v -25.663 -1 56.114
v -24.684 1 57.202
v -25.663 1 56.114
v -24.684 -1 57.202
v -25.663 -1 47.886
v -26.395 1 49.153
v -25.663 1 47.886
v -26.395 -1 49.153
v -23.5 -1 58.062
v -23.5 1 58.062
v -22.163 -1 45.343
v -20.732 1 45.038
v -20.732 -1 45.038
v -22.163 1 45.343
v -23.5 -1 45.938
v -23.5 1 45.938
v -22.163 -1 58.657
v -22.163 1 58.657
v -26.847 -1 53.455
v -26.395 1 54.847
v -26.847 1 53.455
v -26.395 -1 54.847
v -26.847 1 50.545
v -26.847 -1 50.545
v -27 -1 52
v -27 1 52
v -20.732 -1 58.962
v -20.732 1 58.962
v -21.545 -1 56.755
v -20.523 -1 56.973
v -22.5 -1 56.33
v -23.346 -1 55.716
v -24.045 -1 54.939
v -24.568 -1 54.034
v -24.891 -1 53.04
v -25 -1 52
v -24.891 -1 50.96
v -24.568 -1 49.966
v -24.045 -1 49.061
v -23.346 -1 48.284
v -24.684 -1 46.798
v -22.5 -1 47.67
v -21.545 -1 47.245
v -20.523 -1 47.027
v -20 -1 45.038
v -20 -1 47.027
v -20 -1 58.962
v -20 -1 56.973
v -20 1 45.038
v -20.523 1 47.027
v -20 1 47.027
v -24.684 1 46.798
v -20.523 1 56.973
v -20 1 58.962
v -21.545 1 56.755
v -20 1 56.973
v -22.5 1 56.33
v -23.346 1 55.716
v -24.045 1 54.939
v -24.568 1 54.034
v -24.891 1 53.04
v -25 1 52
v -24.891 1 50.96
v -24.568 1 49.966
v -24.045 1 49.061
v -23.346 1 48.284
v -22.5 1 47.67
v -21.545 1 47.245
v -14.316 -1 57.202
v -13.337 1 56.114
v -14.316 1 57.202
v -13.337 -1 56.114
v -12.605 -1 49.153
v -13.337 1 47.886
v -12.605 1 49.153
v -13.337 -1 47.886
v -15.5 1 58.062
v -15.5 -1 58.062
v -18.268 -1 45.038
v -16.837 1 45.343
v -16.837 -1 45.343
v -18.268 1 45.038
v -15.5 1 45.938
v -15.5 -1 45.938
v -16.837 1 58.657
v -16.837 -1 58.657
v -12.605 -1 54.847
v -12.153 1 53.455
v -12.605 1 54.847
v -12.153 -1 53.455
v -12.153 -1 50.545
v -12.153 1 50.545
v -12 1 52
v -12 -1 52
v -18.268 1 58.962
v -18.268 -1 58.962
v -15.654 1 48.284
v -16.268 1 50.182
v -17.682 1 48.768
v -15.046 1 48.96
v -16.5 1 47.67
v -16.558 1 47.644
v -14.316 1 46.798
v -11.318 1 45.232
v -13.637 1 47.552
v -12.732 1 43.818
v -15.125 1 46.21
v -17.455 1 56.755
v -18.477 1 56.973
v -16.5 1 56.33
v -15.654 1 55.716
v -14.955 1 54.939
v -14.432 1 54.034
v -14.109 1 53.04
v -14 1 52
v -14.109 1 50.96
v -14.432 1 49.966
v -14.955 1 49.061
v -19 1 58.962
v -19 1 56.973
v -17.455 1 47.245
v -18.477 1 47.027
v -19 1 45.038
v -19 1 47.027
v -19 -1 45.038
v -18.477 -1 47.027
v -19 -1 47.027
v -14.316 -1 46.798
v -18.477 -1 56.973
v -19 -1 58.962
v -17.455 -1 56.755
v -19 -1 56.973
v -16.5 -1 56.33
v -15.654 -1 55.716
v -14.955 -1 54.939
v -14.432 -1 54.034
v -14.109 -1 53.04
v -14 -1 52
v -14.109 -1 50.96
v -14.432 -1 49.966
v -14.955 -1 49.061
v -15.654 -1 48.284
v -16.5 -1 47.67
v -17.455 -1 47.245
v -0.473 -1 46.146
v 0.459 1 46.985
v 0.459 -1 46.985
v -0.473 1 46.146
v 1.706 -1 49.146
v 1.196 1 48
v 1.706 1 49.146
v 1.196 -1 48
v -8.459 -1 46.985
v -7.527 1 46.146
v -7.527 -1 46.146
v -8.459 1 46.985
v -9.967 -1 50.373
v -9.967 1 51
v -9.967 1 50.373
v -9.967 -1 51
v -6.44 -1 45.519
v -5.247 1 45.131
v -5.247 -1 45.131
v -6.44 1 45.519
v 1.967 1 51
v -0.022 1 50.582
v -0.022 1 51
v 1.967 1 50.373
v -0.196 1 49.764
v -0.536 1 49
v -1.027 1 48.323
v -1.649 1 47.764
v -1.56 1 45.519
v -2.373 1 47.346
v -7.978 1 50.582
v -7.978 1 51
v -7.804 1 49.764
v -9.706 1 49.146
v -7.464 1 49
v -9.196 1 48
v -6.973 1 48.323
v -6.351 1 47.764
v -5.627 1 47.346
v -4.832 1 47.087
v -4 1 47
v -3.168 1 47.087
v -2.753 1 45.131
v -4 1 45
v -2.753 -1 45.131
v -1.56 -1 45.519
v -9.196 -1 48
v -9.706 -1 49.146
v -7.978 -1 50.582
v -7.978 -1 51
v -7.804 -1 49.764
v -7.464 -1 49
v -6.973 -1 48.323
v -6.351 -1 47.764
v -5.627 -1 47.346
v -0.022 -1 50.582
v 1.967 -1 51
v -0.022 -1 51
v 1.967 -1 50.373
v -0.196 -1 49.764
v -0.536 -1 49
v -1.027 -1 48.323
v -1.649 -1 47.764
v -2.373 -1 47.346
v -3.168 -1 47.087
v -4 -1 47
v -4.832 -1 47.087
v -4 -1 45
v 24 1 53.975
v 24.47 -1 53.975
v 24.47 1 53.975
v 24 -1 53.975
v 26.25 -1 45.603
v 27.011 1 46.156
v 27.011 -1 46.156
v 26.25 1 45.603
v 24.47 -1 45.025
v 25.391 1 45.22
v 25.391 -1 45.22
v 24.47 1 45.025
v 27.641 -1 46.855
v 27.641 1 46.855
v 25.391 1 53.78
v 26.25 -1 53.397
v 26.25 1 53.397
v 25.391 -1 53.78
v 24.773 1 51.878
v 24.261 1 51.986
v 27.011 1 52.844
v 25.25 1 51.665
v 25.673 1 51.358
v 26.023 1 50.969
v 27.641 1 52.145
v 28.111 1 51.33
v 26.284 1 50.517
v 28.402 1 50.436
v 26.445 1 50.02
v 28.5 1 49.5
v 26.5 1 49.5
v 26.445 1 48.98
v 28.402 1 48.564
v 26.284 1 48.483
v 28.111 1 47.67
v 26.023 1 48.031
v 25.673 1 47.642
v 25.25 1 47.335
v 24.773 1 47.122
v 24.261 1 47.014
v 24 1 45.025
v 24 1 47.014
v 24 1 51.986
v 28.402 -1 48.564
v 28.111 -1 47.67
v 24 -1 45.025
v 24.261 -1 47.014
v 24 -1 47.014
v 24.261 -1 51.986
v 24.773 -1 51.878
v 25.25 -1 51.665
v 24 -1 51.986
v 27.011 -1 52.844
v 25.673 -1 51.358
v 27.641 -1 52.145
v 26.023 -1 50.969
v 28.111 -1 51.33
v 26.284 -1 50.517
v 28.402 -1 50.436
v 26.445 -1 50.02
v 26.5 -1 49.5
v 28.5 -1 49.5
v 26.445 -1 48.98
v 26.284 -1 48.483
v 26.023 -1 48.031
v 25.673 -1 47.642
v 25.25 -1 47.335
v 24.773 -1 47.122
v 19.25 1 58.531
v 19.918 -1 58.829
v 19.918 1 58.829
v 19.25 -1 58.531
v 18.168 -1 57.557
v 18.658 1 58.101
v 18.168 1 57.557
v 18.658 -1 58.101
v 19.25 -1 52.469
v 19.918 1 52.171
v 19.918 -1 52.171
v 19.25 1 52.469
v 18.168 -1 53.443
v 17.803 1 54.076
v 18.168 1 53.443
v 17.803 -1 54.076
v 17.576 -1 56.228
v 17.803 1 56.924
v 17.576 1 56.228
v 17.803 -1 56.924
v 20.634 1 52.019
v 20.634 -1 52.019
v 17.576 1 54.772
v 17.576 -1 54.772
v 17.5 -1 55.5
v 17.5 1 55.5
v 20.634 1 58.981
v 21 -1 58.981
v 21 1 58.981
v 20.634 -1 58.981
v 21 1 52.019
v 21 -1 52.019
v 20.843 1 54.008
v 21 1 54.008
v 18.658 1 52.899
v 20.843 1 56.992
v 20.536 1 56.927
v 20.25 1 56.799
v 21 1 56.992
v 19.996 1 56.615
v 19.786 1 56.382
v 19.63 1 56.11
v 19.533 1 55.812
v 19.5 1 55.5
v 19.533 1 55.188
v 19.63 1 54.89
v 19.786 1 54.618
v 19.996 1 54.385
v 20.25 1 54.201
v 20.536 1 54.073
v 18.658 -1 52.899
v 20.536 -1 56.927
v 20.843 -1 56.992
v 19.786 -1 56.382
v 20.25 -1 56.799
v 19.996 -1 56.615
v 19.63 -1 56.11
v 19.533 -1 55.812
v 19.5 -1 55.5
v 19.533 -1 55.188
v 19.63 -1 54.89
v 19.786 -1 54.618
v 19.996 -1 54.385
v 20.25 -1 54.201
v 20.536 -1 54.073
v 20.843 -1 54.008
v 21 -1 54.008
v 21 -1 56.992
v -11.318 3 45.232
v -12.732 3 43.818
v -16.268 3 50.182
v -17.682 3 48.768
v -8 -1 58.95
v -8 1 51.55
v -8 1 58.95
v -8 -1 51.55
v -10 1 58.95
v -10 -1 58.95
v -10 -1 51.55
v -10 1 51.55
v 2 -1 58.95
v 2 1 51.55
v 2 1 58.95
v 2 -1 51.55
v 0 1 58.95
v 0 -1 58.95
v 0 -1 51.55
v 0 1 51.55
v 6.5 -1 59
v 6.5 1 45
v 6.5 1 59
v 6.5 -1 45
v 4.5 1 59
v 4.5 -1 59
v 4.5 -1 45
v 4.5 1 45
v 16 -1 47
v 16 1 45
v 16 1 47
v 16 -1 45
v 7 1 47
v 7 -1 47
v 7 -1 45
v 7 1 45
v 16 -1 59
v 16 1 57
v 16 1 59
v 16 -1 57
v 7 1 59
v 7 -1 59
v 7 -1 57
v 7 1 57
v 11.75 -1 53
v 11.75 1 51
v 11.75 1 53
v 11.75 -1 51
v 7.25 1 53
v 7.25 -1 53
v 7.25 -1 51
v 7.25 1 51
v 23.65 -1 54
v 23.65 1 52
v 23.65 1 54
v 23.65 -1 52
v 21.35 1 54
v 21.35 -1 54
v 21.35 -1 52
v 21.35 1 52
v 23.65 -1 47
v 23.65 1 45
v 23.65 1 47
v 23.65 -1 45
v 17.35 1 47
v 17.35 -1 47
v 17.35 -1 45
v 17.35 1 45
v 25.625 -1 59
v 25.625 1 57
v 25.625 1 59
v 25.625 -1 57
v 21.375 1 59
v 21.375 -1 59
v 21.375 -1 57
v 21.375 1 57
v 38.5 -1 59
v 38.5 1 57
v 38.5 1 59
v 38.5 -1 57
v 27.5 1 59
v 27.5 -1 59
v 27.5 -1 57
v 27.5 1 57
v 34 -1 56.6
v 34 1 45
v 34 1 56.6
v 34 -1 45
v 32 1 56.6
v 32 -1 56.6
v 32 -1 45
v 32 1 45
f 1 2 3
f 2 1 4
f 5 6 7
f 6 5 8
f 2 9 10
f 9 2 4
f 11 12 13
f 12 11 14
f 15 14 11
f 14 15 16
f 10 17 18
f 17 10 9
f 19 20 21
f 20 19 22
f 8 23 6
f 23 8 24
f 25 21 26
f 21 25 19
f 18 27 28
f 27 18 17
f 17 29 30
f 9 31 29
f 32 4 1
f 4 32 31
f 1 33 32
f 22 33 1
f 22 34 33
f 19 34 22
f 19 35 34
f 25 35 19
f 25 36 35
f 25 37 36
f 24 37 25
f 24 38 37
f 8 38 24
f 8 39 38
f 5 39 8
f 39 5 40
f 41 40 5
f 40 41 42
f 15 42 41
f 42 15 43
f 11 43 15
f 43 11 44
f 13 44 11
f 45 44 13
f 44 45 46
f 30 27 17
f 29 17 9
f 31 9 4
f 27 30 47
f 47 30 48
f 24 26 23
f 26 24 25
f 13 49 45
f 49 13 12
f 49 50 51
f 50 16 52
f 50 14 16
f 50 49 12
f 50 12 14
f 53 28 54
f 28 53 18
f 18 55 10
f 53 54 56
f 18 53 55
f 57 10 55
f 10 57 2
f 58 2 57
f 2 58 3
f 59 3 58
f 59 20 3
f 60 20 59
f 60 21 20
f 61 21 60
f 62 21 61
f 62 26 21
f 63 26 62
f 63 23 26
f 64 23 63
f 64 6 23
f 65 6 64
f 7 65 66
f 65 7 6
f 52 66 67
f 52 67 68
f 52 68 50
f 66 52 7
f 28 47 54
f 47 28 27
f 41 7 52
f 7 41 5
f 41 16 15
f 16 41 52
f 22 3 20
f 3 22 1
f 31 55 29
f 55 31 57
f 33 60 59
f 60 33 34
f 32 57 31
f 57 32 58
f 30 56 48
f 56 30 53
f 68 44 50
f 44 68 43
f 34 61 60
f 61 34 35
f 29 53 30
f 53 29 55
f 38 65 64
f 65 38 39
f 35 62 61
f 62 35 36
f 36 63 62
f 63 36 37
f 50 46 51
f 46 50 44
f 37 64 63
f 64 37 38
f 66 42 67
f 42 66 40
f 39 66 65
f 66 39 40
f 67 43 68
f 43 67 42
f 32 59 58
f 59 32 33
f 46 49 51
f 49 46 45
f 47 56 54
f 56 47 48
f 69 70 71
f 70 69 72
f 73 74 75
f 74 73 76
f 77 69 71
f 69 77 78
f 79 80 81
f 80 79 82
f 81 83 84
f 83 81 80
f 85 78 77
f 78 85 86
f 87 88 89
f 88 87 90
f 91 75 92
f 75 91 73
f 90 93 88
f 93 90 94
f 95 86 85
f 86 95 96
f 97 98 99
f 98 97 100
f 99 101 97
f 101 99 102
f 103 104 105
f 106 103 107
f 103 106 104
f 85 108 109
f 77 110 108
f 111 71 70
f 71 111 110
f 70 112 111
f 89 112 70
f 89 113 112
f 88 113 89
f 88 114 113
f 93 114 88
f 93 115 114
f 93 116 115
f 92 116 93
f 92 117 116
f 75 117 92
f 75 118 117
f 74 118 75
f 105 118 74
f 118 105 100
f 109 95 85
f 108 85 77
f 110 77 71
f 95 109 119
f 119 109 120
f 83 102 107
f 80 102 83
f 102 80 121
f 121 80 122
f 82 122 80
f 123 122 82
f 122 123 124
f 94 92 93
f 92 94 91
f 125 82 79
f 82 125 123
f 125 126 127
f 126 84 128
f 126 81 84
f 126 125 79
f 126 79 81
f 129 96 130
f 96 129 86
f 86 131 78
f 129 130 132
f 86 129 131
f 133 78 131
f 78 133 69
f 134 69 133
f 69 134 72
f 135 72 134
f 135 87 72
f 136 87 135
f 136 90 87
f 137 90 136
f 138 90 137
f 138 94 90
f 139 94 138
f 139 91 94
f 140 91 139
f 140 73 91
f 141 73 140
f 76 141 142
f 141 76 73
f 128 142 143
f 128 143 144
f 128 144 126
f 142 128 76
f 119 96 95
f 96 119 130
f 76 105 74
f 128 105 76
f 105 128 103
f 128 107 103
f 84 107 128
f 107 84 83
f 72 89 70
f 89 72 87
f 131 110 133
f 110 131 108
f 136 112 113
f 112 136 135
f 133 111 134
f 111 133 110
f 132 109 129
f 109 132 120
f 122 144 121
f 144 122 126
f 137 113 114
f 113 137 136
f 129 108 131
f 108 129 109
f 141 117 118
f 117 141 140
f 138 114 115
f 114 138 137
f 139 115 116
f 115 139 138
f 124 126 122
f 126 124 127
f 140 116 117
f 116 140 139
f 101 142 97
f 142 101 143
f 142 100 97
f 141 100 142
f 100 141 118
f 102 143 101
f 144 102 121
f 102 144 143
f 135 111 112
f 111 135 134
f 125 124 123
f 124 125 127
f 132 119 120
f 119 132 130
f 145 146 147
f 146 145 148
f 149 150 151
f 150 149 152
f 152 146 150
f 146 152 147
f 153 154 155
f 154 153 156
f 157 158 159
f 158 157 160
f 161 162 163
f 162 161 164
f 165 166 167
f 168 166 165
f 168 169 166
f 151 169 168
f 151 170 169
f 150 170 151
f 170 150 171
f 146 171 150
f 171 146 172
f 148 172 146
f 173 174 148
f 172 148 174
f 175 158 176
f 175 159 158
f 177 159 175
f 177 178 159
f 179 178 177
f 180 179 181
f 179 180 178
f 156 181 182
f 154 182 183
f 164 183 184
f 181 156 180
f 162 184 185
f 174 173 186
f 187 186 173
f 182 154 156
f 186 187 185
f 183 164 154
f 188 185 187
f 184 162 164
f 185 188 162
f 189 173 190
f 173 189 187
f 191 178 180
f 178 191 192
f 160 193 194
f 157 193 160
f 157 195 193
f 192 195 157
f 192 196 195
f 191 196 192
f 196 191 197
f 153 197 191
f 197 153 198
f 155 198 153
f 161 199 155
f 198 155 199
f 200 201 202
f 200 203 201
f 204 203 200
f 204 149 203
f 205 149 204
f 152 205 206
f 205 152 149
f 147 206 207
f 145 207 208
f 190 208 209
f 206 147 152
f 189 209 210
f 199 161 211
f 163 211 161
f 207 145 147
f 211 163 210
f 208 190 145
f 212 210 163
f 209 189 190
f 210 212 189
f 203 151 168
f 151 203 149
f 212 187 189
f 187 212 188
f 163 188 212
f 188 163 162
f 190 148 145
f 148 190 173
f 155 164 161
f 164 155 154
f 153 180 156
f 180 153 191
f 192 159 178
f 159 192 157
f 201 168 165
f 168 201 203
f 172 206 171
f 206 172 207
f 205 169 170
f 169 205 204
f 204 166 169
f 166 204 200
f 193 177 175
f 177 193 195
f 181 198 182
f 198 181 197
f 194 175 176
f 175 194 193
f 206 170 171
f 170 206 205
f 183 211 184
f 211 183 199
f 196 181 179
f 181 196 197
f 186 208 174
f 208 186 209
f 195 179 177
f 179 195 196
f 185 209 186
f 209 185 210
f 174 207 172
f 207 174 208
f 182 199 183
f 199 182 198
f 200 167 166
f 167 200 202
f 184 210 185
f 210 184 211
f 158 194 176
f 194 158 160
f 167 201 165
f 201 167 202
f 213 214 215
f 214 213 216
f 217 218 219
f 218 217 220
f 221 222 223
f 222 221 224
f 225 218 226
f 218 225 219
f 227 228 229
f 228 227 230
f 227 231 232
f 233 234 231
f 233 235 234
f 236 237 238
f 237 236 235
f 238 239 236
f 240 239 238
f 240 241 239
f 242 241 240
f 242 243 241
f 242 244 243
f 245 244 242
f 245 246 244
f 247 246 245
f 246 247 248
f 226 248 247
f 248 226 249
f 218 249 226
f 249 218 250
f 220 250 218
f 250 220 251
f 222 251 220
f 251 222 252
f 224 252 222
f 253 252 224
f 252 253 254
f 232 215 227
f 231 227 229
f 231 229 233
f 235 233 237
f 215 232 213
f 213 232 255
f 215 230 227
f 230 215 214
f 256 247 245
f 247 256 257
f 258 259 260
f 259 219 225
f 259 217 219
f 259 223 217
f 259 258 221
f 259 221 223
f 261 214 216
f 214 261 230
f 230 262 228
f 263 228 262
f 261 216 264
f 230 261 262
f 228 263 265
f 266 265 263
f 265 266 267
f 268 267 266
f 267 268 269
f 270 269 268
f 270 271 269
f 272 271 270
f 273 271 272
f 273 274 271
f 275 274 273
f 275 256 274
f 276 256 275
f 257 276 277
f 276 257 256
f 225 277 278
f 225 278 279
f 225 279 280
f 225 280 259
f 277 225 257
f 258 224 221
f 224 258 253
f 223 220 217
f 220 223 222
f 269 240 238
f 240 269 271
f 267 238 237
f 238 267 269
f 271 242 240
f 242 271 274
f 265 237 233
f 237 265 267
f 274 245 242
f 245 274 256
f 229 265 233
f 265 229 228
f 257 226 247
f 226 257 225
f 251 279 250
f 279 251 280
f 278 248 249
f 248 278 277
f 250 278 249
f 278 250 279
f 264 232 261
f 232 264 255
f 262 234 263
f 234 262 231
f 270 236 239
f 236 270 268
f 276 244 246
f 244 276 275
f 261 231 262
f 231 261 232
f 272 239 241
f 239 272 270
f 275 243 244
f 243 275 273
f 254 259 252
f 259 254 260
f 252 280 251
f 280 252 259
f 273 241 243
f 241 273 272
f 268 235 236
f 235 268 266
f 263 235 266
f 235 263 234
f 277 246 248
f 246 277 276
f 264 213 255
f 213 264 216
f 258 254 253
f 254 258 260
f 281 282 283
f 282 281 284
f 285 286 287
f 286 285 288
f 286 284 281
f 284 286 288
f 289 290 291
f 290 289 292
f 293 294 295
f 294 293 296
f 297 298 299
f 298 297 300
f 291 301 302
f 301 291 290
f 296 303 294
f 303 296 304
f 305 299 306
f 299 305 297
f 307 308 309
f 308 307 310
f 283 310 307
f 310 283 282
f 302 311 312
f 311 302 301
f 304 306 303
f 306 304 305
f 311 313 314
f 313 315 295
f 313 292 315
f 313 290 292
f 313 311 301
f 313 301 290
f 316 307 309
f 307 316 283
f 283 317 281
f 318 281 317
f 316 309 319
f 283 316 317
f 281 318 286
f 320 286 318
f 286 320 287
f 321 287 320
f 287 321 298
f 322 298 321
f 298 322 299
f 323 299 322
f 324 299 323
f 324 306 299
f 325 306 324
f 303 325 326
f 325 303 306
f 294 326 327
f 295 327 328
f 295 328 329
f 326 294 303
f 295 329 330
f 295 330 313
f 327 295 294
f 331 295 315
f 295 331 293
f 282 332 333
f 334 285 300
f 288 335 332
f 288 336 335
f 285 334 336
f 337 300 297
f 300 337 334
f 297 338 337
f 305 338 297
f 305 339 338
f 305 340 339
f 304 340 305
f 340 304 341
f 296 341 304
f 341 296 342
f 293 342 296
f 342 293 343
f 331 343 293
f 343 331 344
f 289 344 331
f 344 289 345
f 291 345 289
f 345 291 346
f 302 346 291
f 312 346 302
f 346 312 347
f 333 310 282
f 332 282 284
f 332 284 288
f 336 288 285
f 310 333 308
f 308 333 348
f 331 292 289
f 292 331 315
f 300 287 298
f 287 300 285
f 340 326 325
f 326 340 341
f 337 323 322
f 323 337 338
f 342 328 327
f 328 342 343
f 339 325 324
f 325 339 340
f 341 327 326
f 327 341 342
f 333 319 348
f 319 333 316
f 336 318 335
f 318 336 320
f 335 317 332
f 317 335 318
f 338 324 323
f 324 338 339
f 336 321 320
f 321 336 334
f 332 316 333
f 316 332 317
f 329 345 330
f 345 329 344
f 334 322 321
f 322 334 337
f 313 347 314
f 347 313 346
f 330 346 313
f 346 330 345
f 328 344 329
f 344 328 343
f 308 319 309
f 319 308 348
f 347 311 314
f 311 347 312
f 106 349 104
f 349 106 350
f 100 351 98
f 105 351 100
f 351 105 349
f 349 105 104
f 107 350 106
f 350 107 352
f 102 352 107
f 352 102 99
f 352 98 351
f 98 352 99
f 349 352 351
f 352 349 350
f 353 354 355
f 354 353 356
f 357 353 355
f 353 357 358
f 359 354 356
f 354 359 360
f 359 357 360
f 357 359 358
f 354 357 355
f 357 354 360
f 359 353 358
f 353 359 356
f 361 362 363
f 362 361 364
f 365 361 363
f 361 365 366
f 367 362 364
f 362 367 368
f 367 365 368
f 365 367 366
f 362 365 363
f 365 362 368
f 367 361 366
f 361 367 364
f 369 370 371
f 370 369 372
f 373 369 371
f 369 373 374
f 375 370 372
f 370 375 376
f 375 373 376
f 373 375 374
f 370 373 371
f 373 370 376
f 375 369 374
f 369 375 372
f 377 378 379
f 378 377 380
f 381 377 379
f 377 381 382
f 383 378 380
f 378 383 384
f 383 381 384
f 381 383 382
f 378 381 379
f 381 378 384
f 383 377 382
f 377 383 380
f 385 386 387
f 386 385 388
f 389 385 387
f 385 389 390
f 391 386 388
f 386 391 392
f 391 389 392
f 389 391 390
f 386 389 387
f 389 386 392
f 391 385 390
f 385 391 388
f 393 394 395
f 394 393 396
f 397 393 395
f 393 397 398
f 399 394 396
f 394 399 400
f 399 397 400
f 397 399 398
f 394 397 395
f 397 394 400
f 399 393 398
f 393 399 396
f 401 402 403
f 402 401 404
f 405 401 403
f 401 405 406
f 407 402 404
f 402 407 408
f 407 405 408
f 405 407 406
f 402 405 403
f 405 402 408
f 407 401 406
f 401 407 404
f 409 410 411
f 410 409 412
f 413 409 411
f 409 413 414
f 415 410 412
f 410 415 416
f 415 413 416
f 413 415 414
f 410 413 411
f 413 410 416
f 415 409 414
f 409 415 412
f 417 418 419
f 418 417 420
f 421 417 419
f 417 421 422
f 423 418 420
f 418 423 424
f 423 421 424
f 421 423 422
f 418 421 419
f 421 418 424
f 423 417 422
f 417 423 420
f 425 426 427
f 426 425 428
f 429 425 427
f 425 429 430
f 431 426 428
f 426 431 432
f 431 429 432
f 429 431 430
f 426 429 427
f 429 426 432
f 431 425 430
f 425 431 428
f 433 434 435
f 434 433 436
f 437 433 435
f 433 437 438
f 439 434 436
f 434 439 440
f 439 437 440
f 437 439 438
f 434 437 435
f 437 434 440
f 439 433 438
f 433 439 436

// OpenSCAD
translate([0,0,30])
{
color("#E0D44A",1-$t)
{
translate([-20,0,22])
rotate([90,0,0])
semicircle(7,2);
translate([-19,0,22])
rotate([90,0,180])
semicircle(7,2);
translate([-14.5,2,17])
rotate([0,45,0])
cube([7,2,2],center=true);
translate([-4,0,21])
rotate([90,-90,0])
semicircle(6,2);
translate([-9,0,25.25])
cube([2,2,7.4],center=true);
translate([1,0,25.25])
cube([2,2,7.4],center=true);
translate([5.5,0,22])
cube([2,2,14],center=true);
translate([11.5,0,16])
cube([9,2,2],center=true);
translate([11.5,0,28])
cube([9,2,2],center=true);
translate([9.5,0,22])
cube([4.5,2,2],center=true);
translate([24,0,19.5])
rotate([90,180,0])
semicircle(4.5,2);
translate([21,0,25.5])
rotate([90,0,0])
semicircle(3.5,2);
translate([22.5,0,23])
cube([2.3,2,2],center=true);
translate([20.5,0,16])
cube([6.3,2,2],center=true);
translate([23.5,0,28])
cube([4.25,2,2],center=true);
translate([33,0,28])
cube([11,2,2],center=true);
translate([33,0,20.8])
cube([2,2,11.6],center=true);
}

color("DarkOrange",(0.8*(1-$t)))
translate([-18,0,1])
rotate([90,0,0])
scale([0.4,0.3,0.4])
union(){
text("A Long Ray's Journey",font="Times New Roman");
translate([30,-14,0])
text("Into Light",font="Times New Roman");
}
}




module semicircle(radius=4,height=1) {
    
difference() {
    cylinder(height, radius, radius, $fn=30,center=true);
    cylinder(height+0.2, radius-2, radius-2, $fn=30,center=true);
    translate([radius,0,0])
    cube([(radius*2),(radius*2),height+1],center=true);
}
}
